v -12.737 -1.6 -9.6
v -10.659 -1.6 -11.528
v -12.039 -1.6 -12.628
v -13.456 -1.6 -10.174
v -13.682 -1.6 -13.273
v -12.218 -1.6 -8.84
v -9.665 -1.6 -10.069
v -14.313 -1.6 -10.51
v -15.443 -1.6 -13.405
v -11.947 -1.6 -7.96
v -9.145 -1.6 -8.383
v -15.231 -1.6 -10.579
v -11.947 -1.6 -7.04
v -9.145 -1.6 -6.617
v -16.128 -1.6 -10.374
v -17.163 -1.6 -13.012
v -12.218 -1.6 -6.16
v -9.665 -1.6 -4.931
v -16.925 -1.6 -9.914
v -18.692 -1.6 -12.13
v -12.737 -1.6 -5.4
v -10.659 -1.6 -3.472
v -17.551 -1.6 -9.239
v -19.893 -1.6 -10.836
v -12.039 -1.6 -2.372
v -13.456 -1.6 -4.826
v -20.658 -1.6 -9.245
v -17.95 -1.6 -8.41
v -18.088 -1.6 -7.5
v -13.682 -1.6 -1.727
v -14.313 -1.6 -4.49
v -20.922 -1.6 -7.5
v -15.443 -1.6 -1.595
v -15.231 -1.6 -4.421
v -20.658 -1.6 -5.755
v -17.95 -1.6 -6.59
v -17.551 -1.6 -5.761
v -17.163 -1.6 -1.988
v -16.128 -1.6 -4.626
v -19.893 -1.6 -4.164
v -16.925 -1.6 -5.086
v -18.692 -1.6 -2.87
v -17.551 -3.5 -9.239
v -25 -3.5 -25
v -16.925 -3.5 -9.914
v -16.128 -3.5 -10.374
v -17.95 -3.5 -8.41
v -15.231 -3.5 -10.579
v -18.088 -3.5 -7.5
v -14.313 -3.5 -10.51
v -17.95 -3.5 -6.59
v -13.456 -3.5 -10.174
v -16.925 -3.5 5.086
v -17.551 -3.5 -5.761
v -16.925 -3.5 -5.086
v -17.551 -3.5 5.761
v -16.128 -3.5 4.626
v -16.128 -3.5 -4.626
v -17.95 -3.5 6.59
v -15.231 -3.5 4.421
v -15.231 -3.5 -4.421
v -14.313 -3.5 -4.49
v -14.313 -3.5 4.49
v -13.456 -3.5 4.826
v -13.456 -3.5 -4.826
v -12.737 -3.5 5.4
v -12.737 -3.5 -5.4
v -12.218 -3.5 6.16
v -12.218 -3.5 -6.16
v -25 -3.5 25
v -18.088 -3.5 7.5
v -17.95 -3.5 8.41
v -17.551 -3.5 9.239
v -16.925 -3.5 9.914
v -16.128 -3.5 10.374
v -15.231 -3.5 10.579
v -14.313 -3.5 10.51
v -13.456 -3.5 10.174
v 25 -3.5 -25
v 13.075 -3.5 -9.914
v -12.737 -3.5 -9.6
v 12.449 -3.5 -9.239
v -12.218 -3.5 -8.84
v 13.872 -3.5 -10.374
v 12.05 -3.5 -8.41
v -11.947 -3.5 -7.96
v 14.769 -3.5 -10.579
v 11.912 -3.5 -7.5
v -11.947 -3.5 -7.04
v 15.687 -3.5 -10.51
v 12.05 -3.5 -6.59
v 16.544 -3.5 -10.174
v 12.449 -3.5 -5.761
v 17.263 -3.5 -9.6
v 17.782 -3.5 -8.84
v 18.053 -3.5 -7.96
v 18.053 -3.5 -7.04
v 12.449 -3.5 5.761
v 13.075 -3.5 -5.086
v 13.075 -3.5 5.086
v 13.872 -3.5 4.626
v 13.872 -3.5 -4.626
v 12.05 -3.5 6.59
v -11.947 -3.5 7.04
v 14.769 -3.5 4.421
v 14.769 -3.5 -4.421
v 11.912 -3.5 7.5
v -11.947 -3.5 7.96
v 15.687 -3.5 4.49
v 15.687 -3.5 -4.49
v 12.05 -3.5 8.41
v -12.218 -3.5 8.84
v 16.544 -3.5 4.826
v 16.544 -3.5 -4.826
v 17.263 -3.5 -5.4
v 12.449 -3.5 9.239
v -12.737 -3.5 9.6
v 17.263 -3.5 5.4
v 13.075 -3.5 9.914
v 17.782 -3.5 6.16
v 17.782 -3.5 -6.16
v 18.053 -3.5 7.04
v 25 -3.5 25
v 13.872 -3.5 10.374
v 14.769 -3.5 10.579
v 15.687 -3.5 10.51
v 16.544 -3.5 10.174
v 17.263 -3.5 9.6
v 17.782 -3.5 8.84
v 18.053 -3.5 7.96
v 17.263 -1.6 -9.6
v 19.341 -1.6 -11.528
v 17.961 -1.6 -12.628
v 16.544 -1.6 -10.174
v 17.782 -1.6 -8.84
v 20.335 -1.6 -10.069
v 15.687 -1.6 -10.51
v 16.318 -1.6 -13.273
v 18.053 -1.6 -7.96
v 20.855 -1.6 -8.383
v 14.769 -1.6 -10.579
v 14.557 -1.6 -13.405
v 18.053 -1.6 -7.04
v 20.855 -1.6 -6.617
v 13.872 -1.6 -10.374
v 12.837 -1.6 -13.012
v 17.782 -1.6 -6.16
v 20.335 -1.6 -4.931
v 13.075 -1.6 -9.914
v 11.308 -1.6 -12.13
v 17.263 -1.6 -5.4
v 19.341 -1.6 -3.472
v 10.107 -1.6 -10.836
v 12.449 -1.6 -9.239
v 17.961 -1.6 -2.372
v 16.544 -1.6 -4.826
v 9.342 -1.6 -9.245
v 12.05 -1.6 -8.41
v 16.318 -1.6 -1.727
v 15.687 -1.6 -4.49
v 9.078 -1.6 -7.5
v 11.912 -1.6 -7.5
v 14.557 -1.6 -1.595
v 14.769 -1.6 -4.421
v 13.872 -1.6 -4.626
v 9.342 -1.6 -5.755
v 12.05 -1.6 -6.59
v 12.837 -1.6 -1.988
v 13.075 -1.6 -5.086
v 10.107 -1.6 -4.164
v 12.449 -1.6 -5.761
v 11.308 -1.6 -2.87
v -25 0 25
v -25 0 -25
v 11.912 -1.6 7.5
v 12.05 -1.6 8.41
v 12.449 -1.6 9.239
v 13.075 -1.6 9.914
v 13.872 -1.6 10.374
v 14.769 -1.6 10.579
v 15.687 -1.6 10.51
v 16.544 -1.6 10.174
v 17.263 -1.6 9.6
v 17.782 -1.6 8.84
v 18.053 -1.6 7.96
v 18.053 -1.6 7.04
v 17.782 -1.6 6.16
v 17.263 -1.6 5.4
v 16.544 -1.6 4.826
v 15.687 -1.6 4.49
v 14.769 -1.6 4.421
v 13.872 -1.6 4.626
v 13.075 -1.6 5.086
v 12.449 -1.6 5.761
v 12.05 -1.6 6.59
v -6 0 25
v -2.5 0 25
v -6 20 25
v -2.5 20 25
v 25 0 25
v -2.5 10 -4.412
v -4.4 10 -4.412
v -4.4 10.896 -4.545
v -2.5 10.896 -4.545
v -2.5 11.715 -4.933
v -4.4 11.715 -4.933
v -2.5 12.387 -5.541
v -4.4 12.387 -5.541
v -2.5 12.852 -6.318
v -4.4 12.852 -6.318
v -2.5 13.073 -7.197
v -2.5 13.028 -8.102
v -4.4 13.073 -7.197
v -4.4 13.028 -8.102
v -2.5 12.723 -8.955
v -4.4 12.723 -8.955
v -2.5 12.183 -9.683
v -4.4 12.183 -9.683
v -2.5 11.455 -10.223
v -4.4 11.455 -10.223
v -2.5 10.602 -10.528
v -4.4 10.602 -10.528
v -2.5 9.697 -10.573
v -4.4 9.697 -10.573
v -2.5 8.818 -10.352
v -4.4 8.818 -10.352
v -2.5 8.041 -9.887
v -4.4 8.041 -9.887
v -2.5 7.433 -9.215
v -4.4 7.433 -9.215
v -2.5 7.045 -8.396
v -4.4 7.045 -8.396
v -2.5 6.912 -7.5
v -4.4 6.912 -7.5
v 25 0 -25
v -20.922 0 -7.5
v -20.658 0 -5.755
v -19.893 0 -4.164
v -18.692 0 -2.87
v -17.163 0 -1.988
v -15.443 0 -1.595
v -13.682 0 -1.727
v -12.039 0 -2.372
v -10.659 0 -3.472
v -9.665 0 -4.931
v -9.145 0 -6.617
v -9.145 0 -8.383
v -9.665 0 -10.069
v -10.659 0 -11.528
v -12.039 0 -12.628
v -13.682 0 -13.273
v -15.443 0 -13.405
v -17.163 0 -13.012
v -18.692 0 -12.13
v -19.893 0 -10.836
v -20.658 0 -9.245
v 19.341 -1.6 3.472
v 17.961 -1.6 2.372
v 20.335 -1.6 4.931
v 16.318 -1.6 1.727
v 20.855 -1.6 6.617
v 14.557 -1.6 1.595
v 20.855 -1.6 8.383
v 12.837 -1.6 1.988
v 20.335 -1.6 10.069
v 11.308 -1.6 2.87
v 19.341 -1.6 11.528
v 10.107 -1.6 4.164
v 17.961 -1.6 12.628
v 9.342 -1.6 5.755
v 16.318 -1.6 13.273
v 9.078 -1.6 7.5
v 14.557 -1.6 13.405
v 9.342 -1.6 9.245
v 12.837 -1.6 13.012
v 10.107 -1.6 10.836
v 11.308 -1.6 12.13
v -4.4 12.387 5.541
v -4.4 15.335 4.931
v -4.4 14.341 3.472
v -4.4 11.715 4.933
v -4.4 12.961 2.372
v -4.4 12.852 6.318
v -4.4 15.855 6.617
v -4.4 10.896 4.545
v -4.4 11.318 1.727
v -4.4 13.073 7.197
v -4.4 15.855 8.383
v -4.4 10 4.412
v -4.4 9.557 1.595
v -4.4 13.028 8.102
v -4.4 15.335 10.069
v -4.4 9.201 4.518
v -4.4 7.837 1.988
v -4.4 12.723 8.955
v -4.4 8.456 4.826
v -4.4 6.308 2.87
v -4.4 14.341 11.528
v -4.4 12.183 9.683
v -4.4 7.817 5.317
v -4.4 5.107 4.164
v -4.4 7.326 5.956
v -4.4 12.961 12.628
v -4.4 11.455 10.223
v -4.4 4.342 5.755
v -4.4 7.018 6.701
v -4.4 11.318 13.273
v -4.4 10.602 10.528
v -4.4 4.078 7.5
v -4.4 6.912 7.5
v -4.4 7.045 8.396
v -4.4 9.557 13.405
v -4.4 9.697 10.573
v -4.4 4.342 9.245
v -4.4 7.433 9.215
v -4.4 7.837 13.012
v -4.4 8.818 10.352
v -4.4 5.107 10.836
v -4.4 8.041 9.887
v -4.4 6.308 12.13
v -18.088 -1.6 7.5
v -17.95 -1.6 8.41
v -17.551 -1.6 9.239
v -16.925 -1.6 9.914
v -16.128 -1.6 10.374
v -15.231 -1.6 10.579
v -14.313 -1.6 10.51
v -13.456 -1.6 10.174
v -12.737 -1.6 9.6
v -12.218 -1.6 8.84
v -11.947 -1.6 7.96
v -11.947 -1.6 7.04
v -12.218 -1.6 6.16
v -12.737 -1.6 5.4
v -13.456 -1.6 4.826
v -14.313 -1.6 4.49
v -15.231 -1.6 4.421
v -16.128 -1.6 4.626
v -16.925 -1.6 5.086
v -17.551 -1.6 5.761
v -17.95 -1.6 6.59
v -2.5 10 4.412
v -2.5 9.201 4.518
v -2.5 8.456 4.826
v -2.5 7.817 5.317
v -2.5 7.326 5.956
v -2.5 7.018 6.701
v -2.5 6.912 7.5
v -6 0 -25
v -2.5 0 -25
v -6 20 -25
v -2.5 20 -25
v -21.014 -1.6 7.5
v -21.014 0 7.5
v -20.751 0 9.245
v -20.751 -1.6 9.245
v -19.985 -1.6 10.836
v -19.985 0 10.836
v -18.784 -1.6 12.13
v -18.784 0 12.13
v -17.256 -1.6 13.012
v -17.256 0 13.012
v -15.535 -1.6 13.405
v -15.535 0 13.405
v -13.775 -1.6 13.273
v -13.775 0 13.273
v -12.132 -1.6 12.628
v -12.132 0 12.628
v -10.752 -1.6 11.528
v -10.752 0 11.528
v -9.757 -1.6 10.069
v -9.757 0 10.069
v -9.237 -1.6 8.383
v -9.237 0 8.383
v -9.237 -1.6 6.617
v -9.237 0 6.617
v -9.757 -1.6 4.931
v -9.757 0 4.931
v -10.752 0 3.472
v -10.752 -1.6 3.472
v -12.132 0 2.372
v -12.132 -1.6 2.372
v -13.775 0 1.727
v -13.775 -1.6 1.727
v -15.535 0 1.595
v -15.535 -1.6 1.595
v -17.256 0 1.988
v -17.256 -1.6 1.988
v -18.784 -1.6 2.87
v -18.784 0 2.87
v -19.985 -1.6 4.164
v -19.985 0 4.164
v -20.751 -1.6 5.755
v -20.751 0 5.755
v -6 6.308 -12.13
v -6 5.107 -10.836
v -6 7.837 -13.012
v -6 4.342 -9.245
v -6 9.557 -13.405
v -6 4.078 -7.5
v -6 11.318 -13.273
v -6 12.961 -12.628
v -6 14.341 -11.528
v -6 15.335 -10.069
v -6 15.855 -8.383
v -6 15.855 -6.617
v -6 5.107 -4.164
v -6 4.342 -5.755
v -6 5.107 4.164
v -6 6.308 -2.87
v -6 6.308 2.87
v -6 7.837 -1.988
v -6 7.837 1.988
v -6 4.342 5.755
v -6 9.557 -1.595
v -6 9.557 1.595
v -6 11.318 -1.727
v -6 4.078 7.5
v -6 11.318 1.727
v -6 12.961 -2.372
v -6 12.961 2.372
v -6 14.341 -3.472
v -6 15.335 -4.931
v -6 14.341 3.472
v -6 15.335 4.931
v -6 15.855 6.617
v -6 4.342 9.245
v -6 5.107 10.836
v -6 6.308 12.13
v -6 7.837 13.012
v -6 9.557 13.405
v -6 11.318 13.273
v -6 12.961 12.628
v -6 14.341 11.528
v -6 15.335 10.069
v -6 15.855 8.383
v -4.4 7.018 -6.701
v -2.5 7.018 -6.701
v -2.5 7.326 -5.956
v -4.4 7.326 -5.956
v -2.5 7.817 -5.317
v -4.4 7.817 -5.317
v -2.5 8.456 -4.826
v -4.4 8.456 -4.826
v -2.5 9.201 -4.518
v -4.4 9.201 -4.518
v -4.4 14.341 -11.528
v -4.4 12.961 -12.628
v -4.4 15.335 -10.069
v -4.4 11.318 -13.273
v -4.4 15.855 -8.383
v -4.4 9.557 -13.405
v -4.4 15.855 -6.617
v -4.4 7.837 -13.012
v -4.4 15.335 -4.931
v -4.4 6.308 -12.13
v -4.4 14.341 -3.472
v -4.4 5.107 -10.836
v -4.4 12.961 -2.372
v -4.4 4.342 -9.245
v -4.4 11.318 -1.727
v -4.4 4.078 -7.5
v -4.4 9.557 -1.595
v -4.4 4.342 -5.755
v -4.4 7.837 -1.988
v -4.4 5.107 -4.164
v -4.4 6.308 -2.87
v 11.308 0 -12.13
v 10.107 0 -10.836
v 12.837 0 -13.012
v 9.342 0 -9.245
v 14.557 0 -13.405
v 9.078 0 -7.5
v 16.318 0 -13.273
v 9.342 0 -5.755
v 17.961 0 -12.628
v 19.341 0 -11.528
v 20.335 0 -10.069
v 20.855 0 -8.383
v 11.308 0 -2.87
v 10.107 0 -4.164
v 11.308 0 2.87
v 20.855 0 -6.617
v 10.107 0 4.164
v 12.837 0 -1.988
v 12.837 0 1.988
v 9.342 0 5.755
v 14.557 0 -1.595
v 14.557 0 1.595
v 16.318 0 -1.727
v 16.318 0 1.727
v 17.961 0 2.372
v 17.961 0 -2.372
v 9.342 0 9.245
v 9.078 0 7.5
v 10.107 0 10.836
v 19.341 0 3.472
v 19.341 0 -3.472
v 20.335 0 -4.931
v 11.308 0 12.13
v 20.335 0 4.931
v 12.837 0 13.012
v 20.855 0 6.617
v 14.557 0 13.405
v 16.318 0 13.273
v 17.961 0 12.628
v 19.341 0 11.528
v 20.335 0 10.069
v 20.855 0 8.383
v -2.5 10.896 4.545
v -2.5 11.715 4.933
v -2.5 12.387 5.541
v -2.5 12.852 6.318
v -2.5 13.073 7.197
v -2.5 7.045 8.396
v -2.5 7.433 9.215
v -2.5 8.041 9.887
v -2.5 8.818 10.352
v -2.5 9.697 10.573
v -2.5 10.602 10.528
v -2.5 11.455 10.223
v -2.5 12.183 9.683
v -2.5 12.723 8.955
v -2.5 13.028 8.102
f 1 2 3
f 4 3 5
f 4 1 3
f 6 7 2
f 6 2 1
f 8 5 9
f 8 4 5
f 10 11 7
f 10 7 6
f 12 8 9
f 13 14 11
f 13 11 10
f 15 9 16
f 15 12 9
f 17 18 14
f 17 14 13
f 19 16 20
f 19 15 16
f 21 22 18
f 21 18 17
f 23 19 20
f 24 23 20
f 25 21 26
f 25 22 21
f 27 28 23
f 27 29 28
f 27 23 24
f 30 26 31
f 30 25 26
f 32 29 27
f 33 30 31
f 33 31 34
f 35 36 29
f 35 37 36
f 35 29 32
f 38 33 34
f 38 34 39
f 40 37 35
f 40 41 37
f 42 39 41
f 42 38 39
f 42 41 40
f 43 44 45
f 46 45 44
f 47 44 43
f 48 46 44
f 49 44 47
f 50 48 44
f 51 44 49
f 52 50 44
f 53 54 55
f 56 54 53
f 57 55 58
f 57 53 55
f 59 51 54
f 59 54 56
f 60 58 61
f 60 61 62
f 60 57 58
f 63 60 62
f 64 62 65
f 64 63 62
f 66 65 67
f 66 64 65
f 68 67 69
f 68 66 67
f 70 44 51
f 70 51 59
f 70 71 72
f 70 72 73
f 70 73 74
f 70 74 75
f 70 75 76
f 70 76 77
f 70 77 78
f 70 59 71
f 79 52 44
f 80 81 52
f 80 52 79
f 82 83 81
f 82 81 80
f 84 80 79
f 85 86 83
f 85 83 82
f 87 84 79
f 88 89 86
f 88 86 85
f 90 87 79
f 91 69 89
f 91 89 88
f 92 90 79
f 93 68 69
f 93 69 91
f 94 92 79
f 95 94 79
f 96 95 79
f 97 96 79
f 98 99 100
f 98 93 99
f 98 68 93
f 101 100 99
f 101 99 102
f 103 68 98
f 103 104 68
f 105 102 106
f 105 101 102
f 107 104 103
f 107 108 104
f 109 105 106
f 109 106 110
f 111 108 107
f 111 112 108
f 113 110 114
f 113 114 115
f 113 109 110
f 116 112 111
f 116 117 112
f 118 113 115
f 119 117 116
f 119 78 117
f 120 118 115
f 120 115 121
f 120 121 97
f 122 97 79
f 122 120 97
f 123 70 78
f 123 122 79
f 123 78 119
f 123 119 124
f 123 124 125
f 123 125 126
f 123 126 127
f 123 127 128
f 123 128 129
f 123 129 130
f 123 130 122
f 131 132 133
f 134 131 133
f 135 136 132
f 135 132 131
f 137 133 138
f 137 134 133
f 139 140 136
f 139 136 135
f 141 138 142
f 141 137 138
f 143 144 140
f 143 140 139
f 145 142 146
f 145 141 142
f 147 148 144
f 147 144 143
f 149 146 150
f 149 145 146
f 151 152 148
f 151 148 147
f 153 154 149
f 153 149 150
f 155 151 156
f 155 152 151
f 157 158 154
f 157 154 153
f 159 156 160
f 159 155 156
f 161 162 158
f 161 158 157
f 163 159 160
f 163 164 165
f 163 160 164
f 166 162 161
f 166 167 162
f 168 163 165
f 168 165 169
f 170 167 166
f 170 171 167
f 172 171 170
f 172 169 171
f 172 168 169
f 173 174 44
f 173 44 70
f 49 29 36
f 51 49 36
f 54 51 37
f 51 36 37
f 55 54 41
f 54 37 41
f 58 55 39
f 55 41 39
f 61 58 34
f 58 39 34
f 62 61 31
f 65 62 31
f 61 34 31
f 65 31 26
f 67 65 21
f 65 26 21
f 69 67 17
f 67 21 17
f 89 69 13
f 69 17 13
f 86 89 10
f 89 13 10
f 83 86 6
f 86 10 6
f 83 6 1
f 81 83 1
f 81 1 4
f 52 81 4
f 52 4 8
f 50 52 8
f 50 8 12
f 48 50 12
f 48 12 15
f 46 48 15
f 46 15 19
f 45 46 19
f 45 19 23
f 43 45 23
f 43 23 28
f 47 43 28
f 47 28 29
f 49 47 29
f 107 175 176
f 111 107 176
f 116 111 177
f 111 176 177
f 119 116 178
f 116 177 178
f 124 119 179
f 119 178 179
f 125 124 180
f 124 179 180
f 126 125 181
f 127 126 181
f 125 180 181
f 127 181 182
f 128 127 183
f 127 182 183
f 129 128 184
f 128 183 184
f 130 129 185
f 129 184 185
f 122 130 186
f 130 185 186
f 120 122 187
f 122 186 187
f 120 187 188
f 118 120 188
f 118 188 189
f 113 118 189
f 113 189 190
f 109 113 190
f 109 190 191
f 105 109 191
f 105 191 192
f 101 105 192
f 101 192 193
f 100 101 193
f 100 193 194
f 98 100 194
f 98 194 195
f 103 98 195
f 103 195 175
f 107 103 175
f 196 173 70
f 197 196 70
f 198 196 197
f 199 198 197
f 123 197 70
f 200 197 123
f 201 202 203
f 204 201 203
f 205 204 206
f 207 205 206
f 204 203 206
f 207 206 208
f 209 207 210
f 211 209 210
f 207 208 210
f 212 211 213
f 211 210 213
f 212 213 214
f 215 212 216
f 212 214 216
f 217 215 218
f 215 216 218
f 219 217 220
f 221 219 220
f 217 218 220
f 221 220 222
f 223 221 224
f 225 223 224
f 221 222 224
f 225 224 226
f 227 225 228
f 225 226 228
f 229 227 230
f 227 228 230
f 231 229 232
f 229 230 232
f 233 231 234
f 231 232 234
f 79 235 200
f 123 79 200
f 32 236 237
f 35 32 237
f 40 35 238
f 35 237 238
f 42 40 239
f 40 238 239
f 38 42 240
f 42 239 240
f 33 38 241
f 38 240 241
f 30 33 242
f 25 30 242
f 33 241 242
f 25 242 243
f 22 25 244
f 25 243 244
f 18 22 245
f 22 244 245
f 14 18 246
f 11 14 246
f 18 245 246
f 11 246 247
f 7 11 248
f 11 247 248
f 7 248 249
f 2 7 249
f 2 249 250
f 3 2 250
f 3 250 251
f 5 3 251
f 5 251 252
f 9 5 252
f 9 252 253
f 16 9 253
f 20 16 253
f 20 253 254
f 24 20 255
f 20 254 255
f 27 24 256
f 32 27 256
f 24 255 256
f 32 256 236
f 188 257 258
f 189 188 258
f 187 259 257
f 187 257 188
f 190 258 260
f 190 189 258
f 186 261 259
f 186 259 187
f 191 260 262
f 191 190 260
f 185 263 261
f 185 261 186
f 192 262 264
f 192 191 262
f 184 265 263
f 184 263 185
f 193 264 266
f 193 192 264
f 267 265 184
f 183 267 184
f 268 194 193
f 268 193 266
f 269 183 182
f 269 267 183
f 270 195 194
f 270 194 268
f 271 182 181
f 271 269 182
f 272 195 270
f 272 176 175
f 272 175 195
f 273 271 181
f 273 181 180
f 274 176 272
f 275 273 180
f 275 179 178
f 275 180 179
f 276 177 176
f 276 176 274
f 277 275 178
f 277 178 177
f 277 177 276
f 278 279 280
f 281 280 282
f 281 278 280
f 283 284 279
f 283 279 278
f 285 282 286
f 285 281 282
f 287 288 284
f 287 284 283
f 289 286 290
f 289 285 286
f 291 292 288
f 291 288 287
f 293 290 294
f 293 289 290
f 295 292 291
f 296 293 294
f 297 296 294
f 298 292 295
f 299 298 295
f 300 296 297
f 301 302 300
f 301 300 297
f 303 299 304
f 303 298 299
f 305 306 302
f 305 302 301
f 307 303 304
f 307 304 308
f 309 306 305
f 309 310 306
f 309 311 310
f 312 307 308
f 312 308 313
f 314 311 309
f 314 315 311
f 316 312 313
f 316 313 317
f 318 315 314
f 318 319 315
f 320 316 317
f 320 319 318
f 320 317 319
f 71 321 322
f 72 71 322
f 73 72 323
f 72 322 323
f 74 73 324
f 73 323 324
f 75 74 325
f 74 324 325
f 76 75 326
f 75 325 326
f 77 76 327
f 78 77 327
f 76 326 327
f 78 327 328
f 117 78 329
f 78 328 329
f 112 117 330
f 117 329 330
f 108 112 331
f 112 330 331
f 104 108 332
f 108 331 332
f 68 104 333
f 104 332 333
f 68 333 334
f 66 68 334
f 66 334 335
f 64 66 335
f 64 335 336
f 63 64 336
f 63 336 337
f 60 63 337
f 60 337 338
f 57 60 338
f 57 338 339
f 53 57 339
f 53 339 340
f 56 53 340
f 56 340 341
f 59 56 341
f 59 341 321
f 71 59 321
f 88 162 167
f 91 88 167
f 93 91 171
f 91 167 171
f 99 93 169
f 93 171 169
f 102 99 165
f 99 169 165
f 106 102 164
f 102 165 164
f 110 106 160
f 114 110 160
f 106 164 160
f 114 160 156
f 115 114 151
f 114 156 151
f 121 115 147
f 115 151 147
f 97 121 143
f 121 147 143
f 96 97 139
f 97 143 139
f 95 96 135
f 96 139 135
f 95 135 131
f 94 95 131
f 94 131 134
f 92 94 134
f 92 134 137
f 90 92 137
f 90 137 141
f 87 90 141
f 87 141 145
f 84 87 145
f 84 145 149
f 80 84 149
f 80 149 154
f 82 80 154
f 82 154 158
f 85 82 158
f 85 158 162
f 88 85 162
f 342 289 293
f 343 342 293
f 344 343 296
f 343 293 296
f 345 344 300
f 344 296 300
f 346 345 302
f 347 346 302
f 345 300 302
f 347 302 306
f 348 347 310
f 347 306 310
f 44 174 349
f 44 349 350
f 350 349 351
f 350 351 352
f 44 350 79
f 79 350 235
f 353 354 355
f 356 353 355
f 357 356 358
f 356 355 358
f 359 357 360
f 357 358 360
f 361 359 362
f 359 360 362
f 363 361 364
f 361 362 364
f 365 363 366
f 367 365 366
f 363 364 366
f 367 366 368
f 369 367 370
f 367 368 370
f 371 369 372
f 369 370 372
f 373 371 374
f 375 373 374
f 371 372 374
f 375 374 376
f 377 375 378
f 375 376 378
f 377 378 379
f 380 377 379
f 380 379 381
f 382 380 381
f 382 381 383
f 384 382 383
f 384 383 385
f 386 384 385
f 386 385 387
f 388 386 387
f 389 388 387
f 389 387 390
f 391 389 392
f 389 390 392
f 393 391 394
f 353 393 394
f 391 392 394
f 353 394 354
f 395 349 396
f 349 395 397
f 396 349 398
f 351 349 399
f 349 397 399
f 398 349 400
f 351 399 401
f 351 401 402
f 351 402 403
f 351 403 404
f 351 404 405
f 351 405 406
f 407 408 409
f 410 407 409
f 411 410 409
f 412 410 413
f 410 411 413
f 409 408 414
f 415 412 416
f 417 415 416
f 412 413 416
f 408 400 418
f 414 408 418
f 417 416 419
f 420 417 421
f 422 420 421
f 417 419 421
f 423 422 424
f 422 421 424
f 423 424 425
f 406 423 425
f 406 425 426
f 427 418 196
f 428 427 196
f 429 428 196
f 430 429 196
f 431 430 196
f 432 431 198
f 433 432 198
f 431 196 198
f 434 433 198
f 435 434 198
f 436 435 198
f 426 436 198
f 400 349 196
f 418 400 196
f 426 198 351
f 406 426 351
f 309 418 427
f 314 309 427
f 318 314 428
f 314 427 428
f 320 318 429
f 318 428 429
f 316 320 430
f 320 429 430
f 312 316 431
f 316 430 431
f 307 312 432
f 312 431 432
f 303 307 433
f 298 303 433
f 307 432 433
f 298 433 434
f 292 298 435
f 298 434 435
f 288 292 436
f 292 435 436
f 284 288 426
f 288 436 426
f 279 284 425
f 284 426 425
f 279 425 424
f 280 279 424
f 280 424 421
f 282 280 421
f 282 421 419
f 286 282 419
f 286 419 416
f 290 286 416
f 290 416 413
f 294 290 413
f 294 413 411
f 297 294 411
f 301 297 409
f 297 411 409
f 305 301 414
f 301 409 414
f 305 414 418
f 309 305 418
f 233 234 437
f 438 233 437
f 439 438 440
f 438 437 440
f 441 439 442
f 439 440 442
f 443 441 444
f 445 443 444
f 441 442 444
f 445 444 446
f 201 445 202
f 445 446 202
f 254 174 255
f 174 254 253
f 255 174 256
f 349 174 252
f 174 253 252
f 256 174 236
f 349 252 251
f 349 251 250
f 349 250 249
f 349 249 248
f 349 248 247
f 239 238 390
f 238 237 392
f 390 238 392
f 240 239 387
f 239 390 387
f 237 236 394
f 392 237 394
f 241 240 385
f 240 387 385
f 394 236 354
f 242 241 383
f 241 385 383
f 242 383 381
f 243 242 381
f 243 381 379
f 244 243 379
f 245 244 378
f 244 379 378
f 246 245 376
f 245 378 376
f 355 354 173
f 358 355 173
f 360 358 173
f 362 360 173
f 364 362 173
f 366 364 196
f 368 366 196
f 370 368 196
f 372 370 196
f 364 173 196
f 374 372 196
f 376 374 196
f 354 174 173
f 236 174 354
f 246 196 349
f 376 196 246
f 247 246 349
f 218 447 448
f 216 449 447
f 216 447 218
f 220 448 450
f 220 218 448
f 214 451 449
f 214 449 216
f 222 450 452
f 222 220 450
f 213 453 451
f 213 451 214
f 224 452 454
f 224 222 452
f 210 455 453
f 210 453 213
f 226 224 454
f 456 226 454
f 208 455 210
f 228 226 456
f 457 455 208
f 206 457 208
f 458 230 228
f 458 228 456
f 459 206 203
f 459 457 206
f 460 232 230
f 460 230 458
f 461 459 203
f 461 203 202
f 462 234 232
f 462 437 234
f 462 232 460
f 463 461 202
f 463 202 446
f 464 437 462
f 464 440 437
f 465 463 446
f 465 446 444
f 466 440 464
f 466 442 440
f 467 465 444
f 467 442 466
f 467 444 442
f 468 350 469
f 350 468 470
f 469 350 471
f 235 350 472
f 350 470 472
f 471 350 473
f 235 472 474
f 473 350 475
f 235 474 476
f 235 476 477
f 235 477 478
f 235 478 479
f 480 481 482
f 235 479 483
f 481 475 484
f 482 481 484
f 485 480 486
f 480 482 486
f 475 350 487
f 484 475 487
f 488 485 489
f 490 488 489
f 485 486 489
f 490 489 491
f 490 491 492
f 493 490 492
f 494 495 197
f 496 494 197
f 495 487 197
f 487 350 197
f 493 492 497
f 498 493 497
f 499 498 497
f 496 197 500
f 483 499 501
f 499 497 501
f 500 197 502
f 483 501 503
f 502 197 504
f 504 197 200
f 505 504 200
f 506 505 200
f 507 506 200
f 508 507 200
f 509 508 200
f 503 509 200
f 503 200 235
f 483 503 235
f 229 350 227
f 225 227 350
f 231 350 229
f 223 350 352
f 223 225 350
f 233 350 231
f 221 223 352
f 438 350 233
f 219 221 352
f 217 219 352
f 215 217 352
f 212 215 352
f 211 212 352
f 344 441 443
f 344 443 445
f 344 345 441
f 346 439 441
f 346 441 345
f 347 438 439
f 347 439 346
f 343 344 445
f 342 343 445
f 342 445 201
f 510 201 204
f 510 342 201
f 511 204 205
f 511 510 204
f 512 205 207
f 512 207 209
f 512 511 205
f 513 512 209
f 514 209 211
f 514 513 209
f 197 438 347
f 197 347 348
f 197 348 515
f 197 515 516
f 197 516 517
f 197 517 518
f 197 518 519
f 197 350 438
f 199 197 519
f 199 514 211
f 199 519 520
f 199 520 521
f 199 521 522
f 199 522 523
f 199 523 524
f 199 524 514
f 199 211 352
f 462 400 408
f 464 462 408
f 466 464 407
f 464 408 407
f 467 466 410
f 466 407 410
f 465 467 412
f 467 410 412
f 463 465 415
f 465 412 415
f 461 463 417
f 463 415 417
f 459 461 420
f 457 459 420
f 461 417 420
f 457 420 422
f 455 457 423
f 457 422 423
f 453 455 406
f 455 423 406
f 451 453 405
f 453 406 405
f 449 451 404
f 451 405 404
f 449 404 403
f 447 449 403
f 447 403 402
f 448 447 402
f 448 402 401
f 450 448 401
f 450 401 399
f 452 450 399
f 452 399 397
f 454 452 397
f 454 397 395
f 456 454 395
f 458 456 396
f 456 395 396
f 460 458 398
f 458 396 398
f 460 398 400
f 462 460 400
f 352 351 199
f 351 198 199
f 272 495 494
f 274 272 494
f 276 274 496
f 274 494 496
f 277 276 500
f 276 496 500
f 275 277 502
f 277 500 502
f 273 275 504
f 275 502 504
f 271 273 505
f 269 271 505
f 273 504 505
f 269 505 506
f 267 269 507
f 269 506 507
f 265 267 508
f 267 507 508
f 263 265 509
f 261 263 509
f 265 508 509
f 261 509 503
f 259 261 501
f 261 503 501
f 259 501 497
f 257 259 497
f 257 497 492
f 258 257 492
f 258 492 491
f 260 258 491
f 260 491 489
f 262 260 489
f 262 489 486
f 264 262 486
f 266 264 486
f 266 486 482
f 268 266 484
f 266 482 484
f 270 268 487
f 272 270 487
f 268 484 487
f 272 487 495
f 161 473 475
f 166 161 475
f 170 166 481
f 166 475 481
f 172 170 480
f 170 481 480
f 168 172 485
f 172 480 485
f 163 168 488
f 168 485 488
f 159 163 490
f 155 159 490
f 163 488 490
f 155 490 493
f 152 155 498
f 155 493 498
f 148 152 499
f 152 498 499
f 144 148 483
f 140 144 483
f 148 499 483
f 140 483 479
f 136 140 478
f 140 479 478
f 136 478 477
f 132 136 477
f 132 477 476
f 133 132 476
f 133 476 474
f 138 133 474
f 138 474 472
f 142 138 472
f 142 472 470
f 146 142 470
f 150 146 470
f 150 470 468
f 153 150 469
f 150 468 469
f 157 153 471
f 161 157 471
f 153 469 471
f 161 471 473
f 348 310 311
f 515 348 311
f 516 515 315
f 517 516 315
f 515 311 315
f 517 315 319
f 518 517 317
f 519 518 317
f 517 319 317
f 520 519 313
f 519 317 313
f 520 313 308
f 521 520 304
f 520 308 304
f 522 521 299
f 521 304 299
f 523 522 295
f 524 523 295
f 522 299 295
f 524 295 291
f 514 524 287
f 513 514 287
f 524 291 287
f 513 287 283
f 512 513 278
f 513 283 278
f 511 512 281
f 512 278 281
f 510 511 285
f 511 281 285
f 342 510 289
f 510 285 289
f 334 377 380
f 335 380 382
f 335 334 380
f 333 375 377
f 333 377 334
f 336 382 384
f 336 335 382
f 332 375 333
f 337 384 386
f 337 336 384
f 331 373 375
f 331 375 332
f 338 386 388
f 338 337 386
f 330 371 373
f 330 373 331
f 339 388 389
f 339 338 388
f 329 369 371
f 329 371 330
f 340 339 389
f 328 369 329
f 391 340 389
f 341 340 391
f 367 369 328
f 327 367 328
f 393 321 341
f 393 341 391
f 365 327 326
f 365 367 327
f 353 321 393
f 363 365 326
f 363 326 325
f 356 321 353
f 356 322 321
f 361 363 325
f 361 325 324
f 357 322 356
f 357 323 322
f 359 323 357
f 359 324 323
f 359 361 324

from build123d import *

# Parameters (mm, degrees)
F0_W      = 50
F0_H      = 50
F1_DEPTH  = 3.5
F2_W      = 3.5
F2_H      = 20
F3_DEPTH  = 25
F5_DEPTH  = 25
F6_R      = 5.9215
F7_DEPTH  = 1.6
F8_R      = 3.0875
F9_DEPTH  = 25
F10_R     = 5.9215
F11_DEPTH = 1.6


with BuildPart() as f1:
    # F0 (on Front) → F1 (new body)
    with BuildSketch(Plane.XZ):
        Rectangle(F0_W, F0_H)
    extrude(amount=F1_DEPTH)

    # F2 (on Top) → F3 (join, symmetric)
    with BuildSketch(Plane.XY):
        with Locations((-4.25, 10)):
            Rectangle(F2_W, F2_H)
    extrude(amount=F3_DEPTH, both=True)

    # F4 (on face) → F5 (cut)
    with BuildSketch(Plane(origin=(-6, 0, 0), x_dir=(0, -1, 0), z_dir=(-1, 0, 0))):
        with BuildLine():
            Line((-10, 7.5), (-6.9125, 7.5))
            ThreePointArc((-6.9125, 7.5), (-12.183192, 9.683192), (-10, 4.4125))
            Line((-10, 4.4125), (-10, 7.5))
        make_face()
        with BuildLine():
            ThreePointArc((-6.9125, -7.5), (-7.816808, -5.316808), (-10, -4.4125))
            Line((-10, -4.4125), (-10, -7.5))
            Line((-10, -7.5), (-6.9125, -7.5))
        make_face()
        with BuildLine():
            Line((-10, -7.5), (-10, -4.4125))
            ThreePointArc((-10, -4.4125), (-12.183192, -9.683192), (-6.9125, -7.5))
            Line((-6.9125, -7.5), (-10, -7.5))
        make_face()
        with BuildLine():
            ThreePointArc((-10, 4.4125), (-7.816808, 5.316808), (-6.9125, 7.5))
            Line((-6.9125, 7.5), (-10, 7.5))
            Line((-10, 7.5), (-10, 4.4125))
        make_face()
    extrude(amount=-F5_DEPTH, mode=Mode.SUBTRACT)

    # F6 (on face) → F7 (cut)
    with BuildSketch(Plane(origin=(-6, 0, 0), x_dir=(0, -1, 0), z_dir=(-1, 0, 0))):
        with Locations((-10, 7.5)):
            Circle(F6_R)
        with Locations((-10, -7.5)):
            Circle(F6_R)
    extrude(amount=-F7_DEPTH, mode=Mode.SUBTRACT)

    # F8 (on face) → F9 (cut)
    with BuildSketch(Plane(origin=(0, 0, 0), x_dir=(-1, 0, 0), z_dir=(0, 1, 0))):
        with Locations((-15, 7.5)):
            Circle(F8_R)
        with Locations((-15, -7.5)):
            Circle(F8_R)
        with Locations((15, 7.5)):
            Circle(F8_R)
        with Locations((15, -7.5)):
            Circle(F8_R)
    extrude(amount=-F9_DEPTH, mode=Mode.SUBTRACT)

    # F10 (on face) → F11 (cut)
    with BuildSketch(Plane(origin=(0, 0, 0), x_dir=(-1, 0, 0), z_dir=(0, 1, 0))):
        with Locations((-15, 7.5)):
            Circle(F10_R)
        with Locations((-15, -7.5)):
            Circle(F10_R)
        with Locations((15.092427, 7.5)):
            Circle(F10_R)
        with Locations((15, -7.5)):
            Circle(F10_R)
    extrude(amount=-F11_DEPTH, mode=Mode.SUBTRACT)


solid = f1.part
